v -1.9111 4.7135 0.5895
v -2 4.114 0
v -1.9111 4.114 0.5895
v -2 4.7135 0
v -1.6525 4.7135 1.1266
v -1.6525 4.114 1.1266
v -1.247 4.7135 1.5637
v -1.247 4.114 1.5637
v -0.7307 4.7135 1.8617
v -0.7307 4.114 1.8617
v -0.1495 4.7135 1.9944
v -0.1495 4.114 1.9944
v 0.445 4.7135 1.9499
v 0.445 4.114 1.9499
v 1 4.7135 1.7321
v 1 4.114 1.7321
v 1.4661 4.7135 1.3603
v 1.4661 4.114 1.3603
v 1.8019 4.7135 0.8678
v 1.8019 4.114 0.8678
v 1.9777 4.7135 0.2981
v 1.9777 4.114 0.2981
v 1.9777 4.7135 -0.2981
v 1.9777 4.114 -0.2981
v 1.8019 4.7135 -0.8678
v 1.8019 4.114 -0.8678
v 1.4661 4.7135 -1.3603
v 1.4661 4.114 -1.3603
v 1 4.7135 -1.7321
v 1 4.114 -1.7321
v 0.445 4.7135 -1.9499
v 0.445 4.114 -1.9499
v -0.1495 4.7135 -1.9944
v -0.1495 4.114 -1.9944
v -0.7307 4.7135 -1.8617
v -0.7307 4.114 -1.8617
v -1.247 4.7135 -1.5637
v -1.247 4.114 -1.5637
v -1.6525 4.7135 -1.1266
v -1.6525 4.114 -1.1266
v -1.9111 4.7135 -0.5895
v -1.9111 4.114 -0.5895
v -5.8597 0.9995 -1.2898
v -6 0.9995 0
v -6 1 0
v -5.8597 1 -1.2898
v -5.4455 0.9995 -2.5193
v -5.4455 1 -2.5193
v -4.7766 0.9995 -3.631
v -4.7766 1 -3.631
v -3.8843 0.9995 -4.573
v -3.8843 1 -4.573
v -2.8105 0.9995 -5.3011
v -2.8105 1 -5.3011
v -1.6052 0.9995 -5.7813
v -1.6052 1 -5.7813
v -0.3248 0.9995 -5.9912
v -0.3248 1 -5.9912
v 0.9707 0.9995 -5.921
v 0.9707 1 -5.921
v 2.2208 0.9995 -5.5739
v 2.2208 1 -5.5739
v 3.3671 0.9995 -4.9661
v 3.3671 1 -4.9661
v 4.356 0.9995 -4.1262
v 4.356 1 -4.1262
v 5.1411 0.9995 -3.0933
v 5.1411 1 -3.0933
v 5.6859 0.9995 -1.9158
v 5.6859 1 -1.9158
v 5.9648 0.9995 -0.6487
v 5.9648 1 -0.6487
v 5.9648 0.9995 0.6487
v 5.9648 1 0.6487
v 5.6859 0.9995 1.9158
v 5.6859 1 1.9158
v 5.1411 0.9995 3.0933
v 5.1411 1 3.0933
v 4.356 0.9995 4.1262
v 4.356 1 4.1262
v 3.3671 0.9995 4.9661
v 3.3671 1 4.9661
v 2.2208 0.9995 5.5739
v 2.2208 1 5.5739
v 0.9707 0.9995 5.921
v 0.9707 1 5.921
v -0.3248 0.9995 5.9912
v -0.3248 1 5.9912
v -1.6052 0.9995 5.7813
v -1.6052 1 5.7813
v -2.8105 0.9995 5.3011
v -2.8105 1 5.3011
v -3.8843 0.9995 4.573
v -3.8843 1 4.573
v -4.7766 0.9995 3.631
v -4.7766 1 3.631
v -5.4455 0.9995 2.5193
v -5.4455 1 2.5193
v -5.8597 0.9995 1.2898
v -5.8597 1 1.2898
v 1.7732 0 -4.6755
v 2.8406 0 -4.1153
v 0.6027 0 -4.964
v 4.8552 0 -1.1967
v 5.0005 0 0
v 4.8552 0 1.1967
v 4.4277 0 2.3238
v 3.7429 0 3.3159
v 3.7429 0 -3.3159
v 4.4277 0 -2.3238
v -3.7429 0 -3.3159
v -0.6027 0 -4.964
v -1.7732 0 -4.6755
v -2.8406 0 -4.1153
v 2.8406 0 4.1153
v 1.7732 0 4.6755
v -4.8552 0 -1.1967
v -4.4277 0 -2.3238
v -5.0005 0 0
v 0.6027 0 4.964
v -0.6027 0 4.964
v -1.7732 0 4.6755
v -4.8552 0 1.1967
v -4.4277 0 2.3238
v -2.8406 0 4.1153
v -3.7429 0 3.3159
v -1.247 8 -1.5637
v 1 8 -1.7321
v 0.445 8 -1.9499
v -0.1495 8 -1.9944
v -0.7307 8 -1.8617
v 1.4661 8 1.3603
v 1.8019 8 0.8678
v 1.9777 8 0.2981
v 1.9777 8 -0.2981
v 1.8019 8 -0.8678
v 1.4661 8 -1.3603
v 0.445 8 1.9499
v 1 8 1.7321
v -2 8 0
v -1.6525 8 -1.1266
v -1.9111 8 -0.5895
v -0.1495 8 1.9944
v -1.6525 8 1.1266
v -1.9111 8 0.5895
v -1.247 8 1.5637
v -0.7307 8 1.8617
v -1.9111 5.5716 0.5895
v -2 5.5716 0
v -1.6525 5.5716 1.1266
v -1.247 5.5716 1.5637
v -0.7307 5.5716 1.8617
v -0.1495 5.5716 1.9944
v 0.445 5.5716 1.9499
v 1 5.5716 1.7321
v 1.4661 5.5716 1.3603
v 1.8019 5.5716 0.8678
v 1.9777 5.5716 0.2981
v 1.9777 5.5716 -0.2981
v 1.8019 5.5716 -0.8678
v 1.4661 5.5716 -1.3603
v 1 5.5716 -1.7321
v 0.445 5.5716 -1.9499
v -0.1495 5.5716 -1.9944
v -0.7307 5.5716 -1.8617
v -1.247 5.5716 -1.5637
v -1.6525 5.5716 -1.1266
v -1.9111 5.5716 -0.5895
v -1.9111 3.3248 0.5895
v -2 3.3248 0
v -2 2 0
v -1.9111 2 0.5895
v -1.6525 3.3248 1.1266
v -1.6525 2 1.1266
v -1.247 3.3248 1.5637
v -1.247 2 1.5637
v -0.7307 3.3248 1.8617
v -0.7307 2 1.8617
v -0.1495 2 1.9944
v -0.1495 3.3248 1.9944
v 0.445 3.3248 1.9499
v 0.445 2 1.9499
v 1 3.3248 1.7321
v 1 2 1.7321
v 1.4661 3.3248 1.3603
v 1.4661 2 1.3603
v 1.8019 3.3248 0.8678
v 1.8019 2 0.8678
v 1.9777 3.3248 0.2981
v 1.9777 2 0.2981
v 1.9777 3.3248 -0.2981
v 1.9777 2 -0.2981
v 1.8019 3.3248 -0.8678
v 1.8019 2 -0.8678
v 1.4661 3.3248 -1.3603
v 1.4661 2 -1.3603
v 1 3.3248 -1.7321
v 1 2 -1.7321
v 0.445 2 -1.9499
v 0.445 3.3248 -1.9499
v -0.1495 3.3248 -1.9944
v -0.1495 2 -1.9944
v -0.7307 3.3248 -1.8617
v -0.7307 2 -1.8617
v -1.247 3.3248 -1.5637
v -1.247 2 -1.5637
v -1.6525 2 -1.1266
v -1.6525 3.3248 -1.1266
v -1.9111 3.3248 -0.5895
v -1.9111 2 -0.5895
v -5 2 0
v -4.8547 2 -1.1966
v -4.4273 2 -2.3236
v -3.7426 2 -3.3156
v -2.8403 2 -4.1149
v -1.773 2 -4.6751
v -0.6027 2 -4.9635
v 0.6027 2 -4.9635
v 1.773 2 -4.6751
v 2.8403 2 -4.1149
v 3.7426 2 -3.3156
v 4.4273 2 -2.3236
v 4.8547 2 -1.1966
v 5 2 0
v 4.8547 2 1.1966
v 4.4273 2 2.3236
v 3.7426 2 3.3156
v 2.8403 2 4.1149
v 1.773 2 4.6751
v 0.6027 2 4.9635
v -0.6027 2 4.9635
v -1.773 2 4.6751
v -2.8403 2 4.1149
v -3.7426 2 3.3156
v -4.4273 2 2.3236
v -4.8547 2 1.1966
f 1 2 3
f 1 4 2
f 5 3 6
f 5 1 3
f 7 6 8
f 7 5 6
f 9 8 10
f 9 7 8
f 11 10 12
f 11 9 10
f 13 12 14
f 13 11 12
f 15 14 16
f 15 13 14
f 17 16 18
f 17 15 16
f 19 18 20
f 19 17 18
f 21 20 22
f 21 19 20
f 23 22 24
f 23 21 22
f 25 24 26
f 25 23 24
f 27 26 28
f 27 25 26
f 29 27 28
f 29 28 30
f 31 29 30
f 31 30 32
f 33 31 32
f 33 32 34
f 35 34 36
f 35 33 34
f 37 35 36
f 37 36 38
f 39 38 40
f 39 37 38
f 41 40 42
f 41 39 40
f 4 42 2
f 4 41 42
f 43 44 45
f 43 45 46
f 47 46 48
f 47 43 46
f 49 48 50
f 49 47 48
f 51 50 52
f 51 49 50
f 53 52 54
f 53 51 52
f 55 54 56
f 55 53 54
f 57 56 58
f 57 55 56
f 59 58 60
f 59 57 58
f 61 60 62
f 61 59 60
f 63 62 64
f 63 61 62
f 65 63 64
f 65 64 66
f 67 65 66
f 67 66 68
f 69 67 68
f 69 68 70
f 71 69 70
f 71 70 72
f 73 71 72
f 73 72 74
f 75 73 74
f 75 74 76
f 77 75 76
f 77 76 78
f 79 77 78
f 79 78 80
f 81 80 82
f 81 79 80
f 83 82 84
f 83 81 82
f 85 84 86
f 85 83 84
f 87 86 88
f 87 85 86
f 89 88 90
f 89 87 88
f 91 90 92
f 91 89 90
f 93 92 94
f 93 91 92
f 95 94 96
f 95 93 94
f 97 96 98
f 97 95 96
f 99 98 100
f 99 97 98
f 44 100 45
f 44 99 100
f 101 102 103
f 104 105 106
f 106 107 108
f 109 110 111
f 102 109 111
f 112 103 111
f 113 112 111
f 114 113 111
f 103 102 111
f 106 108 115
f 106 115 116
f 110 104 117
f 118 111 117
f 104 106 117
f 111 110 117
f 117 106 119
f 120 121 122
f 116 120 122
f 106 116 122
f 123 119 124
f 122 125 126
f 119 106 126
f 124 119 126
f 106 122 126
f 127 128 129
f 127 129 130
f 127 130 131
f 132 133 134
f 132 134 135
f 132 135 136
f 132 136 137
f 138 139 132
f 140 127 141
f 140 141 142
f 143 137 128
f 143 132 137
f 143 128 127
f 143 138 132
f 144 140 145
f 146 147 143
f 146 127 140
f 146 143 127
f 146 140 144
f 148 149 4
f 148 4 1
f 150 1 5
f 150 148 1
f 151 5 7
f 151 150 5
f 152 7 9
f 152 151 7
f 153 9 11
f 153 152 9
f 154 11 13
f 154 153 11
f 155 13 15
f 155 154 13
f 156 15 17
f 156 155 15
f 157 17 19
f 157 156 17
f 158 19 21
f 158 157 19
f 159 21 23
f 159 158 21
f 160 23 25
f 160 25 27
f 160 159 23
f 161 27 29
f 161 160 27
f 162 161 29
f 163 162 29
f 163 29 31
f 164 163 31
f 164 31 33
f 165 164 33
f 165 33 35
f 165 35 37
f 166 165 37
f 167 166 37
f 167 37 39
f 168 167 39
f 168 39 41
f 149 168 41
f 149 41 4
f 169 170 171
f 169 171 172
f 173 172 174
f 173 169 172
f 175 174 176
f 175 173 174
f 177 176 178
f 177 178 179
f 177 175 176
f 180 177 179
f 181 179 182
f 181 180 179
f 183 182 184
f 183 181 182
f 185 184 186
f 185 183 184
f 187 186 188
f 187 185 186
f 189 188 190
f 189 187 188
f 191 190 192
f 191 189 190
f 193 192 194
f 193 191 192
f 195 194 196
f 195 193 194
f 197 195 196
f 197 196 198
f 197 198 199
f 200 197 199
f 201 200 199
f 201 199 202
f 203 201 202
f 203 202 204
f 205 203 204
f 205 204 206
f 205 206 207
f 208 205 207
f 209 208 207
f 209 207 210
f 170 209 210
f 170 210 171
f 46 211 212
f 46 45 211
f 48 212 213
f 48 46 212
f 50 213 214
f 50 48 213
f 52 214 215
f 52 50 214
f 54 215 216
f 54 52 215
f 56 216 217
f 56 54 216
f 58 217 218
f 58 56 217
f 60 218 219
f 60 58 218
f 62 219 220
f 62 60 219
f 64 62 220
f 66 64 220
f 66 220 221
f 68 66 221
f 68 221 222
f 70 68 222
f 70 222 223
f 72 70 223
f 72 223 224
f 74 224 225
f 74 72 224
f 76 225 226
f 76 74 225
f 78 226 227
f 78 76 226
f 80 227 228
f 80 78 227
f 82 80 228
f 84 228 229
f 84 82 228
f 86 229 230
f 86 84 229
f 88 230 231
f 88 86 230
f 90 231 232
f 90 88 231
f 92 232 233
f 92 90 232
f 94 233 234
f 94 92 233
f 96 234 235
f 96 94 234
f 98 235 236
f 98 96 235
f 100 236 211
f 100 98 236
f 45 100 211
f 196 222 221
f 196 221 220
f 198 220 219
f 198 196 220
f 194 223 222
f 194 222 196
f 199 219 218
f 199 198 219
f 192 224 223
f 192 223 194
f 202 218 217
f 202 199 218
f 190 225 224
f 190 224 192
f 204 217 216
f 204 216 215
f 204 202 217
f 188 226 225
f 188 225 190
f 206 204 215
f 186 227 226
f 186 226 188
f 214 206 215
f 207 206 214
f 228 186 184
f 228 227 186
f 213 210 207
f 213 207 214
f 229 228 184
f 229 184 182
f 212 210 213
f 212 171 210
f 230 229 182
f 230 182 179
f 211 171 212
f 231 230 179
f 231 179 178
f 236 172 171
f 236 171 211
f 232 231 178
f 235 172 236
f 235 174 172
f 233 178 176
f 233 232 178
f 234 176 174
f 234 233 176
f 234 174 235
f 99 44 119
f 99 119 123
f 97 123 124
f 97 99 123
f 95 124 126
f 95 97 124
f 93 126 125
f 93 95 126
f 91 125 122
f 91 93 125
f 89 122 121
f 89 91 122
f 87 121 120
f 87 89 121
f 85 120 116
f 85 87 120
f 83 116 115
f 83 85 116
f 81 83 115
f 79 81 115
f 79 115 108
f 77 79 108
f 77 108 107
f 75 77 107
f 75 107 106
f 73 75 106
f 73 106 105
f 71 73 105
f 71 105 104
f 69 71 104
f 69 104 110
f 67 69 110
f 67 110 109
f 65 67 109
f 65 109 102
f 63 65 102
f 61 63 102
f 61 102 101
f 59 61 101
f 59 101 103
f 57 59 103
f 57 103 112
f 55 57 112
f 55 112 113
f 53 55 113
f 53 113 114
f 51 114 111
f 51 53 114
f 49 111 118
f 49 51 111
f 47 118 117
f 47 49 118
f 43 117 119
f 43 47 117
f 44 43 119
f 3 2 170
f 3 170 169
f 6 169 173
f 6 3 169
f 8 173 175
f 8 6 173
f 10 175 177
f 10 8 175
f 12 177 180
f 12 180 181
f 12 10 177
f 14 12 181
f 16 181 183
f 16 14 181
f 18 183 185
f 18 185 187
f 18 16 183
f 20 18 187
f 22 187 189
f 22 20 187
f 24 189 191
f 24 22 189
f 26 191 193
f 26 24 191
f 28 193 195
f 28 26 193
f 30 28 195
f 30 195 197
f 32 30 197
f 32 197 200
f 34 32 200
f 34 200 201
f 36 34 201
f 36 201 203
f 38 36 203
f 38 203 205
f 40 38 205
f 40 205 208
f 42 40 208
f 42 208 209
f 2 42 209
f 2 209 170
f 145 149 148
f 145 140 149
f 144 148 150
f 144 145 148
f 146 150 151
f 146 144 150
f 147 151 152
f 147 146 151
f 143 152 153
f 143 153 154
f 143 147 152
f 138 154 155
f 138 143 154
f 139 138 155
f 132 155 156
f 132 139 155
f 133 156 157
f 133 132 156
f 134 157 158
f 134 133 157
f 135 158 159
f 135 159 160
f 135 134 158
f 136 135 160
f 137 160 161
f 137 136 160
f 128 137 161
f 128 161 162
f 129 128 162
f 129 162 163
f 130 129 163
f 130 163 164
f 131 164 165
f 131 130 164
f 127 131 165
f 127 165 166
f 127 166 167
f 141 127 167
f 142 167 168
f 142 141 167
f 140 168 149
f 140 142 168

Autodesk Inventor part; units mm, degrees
ref_plane "YZ Plane" through (0, 0, 0) normal (1, 0, 0) x (0, 1, 0)
ref_plane "XZ Plane" through (0, 0, 0) normal (0, 1, 0) x (-1, 0, 0)
ref_plane "XY Plane" through (0, 0, 0) normal (0, 0, 1) x (1, 0, 0)
sketch "Sketch2" plane through (0, 0, 0) normal (0, 0, 1) x (1, 0, 0)
  line L0 (0, -1.6) -> (0, 9.6) construction
  line L1 (-7.2, 0) -> (1.2, 0) construction
  line L2 (0, 0) -> (-6, 0)
  line L3 (-6, 2) -> (-2, 2)
  line L4 (-2, 2) -> (-2, 4.114)
  line L5 (-2, 4.7135) -> (-2, 8)
  line L6 (-2, 8) -> (0, 8)
  line L7 (0, 0) -> (-6, 0)
  line L8 (-6, 2) -> (-6, 0)
  line L9 (-2, 3.3248) -> (-2, 5.5716)
  line L10 (0, 8) -> (0, 0)
  dimension "d0" = 2
  dimension "d1" = 6
  dimension "d3" = 2
  dimension "d4" = 8
revolve "Revolution1" add sketch "Sketch2" angle 360 about axis through (0, -10, 0) along (0, 1, 0)
chamfer "Chamfer1" distance 1 angle 45 1 edges at (6, 2, 0)
chamfer "Chamfer2" distance 1 angle 45 1 edges at (6, 0, 0)
properties part number "P006-Soupape_entree"
